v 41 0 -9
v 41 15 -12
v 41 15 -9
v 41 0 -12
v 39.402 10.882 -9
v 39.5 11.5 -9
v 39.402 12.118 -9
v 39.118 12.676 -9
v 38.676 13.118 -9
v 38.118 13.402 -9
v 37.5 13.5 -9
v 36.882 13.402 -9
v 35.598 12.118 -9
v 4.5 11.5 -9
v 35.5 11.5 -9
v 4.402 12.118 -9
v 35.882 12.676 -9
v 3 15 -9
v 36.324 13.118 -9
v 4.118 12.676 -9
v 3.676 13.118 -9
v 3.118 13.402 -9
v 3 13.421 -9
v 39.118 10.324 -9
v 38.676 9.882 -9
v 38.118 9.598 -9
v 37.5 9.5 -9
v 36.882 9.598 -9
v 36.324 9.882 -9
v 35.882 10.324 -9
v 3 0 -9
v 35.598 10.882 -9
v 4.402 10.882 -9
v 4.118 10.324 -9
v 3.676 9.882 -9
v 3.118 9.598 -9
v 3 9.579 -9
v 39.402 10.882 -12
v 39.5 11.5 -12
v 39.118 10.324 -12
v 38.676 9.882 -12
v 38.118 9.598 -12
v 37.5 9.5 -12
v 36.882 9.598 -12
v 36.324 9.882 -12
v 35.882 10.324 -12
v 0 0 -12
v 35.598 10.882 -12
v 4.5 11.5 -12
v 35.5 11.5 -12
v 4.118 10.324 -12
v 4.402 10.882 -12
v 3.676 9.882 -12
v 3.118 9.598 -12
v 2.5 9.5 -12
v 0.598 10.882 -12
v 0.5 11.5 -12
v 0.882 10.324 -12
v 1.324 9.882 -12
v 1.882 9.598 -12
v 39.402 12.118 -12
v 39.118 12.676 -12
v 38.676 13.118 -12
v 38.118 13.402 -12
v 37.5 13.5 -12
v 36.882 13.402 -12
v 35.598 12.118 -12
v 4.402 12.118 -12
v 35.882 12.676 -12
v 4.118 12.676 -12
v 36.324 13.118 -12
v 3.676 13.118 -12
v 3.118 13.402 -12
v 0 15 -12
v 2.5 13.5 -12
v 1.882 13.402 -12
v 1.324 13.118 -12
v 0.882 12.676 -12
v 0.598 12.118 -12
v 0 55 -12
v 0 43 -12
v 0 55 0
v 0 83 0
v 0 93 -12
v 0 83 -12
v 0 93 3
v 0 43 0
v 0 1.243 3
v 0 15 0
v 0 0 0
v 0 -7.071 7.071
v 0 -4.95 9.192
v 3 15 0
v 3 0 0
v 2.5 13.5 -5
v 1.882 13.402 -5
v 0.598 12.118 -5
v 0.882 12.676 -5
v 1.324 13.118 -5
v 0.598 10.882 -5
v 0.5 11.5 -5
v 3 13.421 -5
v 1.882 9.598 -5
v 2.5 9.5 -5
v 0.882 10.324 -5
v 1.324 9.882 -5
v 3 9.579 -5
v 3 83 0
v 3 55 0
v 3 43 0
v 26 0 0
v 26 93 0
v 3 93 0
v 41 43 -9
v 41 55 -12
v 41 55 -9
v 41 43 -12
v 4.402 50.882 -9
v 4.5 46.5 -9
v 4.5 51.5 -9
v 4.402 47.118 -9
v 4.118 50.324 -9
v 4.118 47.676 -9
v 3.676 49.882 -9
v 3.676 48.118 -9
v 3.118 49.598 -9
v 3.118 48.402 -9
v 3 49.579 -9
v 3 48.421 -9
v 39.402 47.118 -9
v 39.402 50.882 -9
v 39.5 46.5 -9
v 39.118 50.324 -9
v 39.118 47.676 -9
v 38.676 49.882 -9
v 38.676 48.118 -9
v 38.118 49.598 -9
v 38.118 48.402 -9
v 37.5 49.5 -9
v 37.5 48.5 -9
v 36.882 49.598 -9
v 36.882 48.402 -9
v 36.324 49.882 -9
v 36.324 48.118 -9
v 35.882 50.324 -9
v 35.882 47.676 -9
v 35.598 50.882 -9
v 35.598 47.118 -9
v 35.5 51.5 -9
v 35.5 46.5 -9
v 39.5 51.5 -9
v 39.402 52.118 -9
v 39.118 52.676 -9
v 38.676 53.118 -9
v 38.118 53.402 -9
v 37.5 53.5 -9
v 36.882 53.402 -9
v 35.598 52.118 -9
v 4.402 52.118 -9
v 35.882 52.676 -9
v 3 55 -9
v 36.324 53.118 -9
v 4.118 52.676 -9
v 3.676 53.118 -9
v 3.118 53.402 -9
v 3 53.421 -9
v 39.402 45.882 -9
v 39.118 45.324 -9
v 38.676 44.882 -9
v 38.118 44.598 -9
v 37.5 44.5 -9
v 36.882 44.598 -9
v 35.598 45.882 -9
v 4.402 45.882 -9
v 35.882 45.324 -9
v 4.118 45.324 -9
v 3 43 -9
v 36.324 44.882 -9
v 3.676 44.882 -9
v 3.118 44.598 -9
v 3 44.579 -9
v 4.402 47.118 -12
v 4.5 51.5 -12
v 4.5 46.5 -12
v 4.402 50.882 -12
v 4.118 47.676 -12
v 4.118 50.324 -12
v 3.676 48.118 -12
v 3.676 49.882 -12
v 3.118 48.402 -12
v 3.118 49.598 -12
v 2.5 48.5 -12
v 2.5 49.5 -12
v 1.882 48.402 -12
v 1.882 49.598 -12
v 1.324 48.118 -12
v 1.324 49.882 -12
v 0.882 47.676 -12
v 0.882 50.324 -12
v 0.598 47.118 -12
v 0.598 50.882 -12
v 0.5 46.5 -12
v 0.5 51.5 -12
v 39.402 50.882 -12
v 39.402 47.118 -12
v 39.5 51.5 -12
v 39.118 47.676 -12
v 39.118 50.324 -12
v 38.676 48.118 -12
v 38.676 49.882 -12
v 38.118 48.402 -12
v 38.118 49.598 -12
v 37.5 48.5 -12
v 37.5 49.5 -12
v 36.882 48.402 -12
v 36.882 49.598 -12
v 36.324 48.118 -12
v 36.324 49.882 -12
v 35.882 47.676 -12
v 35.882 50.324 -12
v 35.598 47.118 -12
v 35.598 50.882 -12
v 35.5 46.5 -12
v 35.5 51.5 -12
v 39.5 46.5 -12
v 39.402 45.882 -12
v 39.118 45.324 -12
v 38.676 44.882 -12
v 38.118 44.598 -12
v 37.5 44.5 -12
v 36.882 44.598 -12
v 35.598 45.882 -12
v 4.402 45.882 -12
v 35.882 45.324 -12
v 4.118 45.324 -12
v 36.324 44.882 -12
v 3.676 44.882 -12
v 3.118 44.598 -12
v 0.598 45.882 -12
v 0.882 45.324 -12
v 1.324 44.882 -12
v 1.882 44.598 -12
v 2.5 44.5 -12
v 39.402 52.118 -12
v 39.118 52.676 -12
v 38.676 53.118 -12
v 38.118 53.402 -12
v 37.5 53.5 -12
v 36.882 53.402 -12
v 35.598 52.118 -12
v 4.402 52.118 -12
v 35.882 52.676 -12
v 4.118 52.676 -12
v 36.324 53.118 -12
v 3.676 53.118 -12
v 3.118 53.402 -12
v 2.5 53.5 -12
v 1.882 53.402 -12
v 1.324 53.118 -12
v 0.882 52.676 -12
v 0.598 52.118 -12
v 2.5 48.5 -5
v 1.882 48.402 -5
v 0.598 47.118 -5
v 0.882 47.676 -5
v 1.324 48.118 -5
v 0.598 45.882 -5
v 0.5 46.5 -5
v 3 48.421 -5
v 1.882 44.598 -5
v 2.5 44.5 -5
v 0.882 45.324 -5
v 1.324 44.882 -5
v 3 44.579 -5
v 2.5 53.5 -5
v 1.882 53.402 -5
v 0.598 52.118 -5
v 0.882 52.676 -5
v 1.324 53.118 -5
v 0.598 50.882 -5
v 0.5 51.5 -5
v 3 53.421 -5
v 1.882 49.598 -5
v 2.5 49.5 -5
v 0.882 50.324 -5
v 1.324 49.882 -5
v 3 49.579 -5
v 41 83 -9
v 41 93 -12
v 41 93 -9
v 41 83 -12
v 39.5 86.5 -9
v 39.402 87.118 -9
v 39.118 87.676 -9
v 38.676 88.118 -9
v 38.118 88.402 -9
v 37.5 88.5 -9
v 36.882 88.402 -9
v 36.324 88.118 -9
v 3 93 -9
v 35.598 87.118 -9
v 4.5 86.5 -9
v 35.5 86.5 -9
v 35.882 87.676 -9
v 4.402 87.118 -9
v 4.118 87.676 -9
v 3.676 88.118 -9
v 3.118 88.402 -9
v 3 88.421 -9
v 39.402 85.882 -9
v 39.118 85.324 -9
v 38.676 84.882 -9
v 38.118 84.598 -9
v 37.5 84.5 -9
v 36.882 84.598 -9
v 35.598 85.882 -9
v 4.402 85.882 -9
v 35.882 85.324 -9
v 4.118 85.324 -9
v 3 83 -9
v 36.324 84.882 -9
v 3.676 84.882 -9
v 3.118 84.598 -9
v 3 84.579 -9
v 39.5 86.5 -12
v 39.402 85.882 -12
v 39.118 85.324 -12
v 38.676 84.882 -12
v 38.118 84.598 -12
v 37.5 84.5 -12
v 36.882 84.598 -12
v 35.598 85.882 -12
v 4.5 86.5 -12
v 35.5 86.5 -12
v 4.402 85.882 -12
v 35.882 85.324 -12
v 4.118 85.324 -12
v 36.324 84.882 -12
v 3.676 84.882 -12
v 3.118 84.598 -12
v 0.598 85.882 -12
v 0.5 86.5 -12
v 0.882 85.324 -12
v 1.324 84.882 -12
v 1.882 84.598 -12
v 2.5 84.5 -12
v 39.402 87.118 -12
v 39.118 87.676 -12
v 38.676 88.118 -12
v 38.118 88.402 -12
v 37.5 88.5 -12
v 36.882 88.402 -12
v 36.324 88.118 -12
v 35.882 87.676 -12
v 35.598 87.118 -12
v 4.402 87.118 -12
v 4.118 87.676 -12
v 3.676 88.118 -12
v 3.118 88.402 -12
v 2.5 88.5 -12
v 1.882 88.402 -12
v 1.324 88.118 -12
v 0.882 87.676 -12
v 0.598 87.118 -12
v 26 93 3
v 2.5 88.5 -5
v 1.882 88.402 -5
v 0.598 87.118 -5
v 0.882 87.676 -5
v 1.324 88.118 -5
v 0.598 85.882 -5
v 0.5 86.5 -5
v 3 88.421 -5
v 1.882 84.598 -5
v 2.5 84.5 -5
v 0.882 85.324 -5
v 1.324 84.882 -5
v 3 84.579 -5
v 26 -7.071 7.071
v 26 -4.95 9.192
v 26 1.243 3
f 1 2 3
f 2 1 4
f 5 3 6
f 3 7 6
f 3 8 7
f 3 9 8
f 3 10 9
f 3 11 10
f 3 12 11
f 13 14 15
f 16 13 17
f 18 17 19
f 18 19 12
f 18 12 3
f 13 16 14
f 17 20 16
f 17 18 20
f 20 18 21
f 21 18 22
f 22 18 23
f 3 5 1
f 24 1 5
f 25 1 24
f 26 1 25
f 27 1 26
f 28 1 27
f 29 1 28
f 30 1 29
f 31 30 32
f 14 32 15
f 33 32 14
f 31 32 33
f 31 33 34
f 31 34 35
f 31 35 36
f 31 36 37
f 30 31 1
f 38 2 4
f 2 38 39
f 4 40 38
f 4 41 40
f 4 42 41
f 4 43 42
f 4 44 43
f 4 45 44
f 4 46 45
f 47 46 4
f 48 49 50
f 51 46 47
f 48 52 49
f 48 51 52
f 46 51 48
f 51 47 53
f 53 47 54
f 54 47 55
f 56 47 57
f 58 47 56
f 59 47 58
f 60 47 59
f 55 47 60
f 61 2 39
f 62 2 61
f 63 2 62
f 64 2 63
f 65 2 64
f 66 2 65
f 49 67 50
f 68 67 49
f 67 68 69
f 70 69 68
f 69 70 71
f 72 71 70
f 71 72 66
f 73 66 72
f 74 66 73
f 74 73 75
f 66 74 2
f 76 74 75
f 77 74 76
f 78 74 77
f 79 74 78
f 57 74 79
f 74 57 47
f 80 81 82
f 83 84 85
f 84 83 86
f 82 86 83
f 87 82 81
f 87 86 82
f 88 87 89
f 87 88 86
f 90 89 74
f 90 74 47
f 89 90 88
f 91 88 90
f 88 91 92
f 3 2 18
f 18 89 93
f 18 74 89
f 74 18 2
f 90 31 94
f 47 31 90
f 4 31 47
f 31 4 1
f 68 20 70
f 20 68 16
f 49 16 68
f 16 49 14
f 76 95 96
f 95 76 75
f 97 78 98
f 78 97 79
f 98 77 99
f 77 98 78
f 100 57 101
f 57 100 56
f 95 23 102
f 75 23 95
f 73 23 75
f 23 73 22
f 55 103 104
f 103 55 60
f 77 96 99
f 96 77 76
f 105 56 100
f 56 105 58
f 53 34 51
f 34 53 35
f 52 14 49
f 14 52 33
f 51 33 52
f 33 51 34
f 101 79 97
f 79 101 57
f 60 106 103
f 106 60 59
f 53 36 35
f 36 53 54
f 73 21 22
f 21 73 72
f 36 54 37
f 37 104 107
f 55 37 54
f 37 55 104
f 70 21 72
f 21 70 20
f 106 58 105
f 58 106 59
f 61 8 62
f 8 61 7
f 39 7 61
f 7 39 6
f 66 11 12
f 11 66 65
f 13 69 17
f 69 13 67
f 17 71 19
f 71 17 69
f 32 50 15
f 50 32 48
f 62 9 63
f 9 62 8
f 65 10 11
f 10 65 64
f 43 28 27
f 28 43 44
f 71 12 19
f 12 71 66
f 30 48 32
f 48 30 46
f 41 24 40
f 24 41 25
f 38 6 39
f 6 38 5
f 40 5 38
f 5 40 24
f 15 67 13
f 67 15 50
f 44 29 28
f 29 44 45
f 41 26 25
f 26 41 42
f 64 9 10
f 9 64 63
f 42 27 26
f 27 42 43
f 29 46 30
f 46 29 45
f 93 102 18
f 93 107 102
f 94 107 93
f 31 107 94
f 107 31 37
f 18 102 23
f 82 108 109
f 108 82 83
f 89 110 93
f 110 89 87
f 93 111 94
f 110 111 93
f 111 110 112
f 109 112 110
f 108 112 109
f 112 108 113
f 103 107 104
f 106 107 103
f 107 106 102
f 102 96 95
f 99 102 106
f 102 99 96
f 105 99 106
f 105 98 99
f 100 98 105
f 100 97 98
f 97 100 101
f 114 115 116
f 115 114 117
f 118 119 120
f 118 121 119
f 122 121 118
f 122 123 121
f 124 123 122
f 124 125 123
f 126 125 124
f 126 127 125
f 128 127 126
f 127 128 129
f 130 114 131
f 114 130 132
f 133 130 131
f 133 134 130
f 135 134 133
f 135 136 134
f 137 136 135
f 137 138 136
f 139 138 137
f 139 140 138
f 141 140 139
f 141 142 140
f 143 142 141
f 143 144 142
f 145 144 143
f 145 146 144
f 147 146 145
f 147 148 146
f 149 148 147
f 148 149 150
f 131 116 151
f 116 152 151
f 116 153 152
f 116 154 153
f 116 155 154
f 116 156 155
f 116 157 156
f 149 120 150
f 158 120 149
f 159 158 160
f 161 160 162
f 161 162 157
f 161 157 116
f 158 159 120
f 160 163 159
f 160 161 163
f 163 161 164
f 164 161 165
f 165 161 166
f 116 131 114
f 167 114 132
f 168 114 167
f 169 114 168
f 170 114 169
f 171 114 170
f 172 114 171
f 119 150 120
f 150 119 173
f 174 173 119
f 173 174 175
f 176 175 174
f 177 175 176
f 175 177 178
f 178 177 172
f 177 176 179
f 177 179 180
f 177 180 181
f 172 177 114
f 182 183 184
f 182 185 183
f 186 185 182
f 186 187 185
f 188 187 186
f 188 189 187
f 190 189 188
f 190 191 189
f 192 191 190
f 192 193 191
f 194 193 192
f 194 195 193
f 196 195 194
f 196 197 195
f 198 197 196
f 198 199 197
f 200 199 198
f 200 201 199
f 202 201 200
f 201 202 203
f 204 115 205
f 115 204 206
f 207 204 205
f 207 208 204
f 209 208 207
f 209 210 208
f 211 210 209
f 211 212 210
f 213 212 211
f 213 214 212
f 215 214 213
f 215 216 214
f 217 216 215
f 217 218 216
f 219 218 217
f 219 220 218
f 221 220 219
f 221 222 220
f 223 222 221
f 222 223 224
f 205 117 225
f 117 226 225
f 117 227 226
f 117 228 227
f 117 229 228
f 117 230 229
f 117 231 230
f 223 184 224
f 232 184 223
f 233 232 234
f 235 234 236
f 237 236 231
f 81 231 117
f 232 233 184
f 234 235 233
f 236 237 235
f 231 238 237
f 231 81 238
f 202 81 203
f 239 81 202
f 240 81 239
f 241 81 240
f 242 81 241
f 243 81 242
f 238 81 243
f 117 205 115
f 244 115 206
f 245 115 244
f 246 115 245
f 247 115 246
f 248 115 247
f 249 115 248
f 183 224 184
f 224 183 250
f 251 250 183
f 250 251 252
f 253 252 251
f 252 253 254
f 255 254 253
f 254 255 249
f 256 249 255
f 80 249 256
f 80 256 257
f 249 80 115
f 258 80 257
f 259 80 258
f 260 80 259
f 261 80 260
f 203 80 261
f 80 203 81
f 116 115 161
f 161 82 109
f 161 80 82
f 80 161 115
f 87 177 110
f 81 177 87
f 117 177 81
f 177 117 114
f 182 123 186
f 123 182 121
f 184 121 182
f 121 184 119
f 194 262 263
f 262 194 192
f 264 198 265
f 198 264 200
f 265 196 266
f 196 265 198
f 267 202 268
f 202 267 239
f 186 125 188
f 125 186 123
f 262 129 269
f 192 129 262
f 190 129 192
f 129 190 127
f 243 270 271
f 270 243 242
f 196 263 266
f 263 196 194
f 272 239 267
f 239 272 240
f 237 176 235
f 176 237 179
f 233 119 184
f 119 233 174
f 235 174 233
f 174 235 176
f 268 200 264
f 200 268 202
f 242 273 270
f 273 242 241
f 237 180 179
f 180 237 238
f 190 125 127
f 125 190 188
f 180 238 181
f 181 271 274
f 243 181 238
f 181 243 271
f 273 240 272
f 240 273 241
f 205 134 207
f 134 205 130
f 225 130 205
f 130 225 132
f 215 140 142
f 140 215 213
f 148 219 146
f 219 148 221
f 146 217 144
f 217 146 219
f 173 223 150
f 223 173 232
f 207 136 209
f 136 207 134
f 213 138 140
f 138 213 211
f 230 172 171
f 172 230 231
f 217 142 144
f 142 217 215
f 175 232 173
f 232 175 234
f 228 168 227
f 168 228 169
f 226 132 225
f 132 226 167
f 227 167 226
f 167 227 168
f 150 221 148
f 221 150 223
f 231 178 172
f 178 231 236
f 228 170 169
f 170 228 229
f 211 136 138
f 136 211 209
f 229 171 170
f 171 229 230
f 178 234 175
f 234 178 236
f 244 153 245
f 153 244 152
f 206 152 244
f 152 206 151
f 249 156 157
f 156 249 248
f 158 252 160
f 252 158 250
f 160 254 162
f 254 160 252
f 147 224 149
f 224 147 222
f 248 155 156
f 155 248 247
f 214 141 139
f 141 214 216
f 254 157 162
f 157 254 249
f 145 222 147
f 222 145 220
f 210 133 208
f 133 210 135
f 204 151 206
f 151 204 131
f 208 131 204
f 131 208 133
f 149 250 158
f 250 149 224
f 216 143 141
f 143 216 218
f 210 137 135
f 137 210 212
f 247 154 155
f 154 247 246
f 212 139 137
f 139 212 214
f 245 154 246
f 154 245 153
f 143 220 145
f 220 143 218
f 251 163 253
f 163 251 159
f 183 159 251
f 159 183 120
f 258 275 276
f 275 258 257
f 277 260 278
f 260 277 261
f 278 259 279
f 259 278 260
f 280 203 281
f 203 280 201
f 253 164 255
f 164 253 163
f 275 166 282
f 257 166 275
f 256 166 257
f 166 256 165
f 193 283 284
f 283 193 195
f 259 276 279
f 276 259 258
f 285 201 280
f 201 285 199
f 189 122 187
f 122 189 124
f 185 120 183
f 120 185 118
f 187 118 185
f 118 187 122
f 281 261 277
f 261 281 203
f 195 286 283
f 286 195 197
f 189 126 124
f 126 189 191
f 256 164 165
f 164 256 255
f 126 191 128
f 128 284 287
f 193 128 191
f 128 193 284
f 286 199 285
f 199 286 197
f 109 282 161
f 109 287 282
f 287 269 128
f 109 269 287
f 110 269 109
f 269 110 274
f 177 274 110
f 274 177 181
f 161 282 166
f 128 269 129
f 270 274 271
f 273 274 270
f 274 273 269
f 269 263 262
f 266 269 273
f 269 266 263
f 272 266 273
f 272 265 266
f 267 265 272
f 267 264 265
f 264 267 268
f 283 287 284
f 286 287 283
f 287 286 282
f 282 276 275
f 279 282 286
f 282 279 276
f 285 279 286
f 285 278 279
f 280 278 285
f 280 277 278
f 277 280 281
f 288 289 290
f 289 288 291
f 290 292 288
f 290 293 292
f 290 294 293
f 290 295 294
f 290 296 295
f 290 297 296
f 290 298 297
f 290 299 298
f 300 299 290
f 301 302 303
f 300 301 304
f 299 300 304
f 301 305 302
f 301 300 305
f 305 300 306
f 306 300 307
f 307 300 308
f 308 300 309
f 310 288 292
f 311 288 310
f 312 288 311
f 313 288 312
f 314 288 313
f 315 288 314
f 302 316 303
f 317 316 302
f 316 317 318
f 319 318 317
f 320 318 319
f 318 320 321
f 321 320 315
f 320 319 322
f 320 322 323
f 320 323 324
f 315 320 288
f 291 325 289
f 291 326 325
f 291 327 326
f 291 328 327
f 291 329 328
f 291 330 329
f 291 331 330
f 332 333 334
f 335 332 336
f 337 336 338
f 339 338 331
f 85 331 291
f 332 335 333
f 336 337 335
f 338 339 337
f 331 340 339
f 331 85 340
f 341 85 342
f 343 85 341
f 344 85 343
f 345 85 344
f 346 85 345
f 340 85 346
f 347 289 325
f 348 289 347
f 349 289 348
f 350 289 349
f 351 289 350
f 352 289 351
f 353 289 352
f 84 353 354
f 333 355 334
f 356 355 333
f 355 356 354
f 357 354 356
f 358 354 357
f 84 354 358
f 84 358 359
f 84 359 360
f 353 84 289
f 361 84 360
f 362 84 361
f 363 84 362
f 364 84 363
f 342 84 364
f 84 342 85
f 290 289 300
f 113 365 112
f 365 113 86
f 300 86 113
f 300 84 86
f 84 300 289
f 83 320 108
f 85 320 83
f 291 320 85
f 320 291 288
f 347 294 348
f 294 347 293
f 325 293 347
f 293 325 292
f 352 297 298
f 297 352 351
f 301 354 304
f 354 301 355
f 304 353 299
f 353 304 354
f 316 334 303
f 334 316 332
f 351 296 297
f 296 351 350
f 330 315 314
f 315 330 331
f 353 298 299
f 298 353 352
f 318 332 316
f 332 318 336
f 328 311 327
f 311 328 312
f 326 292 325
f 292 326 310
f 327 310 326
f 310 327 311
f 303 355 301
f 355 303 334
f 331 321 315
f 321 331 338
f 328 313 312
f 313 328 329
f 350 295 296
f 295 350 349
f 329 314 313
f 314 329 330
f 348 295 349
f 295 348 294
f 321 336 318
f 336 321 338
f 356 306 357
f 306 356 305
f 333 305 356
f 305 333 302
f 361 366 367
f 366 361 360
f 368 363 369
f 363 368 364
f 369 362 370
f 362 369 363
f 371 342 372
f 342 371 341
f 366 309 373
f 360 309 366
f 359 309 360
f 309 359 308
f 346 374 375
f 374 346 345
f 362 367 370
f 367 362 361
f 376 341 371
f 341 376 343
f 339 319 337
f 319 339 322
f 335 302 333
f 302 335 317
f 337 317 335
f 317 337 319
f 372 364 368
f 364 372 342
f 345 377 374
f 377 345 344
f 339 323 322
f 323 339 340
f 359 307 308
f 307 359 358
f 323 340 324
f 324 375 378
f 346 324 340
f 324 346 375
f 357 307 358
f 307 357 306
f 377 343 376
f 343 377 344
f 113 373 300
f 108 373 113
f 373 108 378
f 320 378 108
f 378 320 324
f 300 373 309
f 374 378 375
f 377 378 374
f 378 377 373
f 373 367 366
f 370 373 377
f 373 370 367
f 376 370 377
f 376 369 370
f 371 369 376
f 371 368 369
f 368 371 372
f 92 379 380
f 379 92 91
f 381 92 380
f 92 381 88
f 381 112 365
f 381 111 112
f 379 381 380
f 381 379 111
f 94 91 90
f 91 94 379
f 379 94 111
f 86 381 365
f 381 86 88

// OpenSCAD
l = 60;
ll = 33;
w = 26;
t = 3;
p = 15;
pp = 10;
$fn = 20;

// translate([0,10,-20])cube([30,30,8]);
module clips(){
difference(){
    translate([0,0,-12])cube([41,p,3]);
    translate([2.5,11.5,-20])cylinder(h=15, r=2);
    translate([37.5,11.5,-20])cylinder(h=15, r=2);
}
difference(){
    translate([0,0,-12])cube([t,p,12]);
    translate([2.5,11.5,-20])cylinder(h=15, r=2);
}

translate([0,9,0])difference(){
    translate([0,p+19,-12])cube([41,p-3,3]);
    translate([2.5,37.5,-20])cylinder(h=15, r=2);
    translate([37.5,37.5,-20])cylinder(h=15, r=2);
    translate([37.5,42.5,-20])cylinder(h=15, r=2);
    translate([2.5,42.5,-20])cylinder(h=15, r=2);
};
translate([0,9,0])difference(){
    translate([0,p+19,-12])cube([t,p-3,12]);
    translate([2.5,37.5,-20])cylinder(h=15, r=2);
    translate([2.5,42.5,-20])cylinder(h=15, r=2);
};
translate([0,14,0])difference(){
    translate([0,p+54,-12])cube([41,p-5,3]);
    translate([37.5,72.5,-20])cylinder(h=15, r=2);
    translate([2.5,72.5,-20])cylinder(h=15, r=2);
};
translate([0,14,0])difference(){
    translate([0,p+54,-12])cube([t,p-5,12]);
    translate([2.5,72.5,-20])cylinder(h=15, r=2);
};
}
clips();
rotate(45,[90,0,0])cube([w,t,pp]);
cube([w,l,t]);
translate([0,l,0])cube([w,ll,t]);
// translate([0,9,-22])cube([40,40,10]);
// translate([0,49,-22])cube([40,40,10]);
